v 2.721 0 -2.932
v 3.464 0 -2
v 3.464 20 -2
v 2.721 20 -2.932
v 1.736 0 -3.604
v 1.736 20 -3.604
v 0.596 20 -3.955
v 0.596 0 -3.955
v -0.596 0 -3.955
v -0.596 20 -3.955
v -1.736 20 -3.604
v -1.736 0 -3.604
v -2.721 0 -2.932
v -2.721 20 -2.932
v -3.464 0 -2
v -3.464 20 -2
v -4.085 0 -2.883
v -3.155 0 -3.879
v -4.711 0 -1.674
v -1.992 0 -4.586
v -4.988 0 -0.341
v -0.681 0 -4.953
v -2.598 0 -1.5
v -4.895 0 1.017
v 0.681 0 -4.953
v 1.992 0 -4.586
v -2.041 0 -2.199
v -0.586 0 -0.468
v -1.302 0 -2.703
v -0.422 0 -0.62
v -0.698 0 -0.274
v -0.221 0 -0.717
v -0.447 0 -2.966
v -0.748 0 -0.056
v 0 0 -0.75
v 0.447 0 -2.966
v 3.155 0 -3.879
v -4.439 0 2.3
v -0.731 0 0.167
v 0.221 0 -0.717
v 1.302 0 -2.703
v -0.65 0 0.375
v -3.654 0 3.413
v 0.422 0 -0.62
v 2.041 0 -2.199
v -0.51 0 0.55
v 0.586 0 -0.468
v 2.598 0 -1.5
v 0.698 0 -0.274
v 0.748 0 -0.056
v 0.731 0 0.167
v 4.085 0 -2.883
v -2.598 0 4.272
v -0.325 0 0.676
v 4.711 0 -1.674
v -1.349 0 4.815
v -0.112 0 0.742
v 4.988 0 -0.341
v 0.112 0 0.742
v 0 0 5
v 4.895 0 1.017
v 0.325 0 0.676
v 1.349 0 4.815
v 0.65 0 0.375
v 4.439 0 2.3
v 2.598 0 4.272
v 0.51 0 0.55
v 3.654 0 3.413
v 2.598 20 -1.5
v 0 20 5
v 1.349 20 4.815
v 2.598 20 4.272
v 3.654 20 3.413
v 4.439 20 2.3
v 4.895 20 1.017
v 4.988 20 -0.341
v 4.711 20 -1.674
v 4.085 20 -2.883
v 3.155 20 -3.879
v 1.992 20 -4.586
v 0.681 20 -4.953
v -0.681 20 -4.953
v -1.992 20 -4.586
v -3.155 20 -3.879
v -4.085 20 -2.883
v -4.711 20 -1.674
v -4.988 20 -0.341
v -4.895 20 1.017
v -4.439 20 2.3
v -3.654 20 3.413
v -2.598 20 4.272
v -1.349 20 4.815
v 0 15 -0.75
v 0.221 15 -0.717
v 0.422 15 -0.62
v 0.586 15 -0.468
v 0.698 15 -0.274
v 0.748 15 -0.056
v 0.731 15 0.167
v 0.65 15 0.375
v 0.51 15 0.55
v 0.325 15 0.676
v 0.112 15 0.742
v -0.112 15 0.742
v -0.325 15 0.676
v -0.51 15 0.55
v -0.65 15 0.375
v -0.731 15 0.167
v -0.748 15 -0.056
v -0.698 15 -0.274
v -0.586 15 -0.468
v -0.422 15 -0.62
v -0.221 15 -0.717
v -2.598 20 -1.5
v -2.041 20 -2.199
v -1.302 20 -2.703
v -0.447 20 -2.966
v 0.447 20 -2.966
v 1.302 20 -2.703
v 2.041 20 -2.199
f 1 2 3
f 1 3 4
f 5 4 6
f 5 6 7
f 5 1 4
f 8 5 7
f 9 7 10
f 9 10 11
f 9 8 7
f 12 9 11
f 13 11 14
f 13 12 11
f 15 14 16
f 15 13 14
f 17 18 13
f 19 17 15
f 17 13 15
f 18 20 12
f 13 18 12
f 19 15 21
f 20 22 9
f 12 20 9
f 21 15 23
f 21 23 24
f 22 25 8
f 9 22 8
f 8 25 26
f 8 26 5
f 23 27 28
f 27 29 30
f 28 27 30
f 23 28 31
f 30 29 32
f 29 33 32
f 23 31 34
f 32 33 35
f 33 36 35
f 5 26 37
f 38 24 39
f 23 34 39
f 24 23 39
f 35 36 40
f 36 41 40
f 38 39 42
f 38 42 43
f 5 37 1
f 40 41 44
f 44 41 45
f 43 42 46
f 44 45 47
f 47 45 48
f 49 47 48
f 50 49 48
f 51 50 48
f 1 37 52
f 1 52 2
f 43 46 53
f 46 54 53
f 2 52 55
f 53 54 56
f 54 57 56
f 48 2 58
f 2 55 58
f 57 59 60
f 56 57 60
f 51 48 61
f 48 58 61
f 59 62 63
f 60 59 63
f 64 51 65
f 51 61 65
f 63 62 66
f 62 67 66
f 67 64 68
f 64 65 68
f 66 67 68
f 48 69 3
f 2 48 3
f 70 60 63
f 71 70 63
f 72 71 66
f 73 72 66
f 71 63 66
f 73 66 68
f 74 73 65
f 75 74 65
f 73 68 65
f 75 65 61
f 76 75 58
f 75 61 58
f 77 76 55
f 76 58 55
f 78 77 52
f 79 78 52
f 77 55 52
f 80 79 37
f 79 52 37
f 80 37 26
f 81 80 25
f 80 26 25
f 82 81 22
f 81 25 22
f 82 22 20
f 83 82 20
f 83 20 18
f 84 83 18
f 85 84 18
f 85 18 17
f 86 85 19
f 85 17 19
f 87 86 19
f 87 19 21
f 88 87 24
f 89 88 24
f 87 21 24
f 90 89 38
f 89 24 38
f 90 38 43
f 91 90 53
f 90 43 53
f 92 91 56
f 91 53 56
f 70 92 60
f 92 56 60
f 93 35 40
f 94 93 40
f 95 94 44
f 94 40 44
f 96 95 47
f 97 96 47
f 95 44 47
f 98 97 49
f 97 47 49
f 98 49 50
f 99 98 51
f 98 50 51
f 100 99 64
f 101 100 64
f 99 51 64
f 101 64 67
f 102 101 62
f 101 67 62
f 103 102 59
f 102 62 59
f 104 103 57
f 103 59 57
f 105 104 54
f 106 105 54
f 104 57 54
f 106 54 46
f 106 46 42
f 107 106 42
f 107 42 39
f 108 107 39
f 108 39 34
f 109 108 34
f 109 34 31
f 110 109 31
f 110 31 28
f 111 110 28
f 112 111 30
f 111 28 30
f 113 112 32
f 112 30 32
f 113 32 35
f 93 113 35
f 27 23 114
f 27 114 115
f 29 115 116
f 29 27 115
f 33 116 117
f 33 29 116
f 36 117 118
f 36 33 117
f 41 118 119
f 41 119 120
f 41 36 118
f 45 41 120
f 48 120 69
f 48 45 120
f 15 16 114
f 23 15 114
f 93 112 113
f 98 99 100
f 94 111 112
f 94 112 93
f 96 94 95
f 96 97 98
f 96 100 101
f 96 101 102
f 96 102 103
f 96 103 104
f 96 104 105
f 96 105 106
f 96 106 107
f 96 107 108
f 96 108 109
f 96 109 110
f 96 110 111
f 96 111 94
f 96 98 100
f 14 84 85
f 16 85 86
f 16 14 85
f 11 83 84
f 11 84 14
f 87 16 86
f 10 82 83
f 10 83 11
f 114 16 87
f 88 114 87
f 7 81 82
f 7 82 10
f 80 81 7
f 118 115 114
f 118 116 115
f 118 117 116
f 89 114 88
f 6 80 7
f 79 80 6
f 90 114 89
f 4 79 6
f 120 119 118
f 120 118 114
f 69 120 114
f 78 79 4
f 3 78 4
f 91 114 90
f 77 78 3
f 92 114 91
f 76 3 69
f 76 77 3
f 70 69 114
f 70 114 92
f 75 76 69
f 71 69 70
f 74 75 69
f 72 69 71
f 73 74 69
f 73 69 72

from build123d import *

# Parameters (mm, degrees)
SKETCH1_R           = 5
BOSS_EXTRUDE1_DEPTH = 20
SKETCH2_R           = 0.75
CUT_EXTRUDE1_DEPTH  = 15


with BuildPart() as part:
    # Sketch1 → Boss-Extrude1 (new body)
    with BuildSketch(Plane(origin=(0, 0, 0), x_dir=(1, 0, 0), z_dir=(0, 1, 0))):
        with Locations(Location((0, 0, 0), (0, 0, 270))):
            Circle(SKETCH1_R)
        with BuildLine():
            Line((-3.464101615, 2), (-2.598076211, 1.5))
            ThreePointArc((-2.598076211, 1.5), (0, 3), (2.598076211, 1.5))
            Line((2.598076211, 1.5), (3.464101615, 2))
            ThreePointArc((3.464101615, 2), (0, 4), (-3.464101615, 2))
        make_face(mode=Mode.SUBTRACT)
    extrude(amount=BOSS_EXTRUDE1_DEPTH)

    # Sketch2 → Cut-Extrude1 (cut)
    with BuildSketch(Plane.XZ):
        with Locations(Location((0, 0, 0), (0, 0, 270))):
            Circle(SKETCH2_R)
    extrude(amount=-CUT_EXTRUDE1_DEPTH, mode=Mode.SUBTRACT)


solid = part.part
